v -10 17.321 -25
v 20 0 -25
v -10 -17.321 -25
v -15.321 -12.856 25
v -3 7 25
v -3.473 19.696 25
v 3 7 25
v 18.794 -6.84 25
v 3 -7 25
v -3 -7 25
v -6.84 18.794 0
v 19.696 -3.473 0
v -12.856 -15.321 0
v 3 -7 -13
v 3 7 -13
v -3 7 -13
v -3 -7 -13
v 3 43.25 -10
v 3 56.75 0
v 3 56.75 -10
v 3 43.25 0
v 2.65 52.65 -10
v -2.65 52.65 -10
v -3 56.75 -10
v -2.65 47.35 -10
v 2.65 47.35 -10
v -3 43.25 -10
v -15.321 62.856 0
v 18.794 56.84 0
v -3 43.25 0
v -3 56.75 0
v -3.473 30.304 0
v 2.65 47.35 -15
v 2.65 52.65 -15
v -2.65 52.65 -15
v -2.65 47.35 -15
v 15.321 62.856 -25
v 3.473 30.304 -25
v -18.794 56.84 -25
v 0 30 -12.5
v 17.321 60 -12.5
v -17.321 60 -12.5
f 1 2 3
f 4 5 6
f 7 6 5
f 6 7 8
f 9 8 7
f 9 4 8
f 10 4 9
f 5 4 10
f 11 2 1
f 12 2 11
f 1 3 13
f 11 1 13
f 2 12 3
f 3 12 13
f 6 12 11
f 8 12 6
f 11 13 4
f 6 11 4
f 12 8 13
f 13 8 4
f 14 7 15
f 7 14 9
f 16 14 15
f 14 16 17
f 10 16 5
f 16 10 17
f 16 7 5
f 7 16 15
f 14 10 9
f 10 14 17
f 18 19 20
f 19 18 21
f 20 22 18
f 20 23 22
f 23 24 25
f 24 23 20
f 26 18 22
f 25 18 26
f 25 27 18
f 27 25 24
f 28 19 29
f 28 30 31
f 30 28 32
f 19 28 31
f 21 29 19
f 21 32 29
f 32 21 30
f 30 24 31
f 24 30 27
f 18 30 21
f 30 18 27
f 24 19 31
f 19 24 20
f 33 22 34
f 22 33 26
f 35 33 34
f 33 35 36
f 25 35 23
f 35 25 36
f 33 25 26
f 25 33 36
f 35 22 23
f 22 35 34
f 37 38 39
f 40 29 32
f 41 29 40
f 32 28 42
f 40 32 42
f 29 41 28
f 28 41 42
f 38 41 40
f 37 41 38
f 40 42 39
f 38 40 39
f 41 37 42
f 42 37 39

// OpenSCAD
/***********************************************************************
Name ......... : usbCase.scad
Description....: Customizable USB Case
Author ....... : Garrett Melenka
Version ...... : V1.0 2016/12/17
Licence ...... : GPL
***********************************************************************/

//Outer Diameter of Usb Case
diameter = 40;
//Height of Usb Case
usbHeight = 50;
//Height of Use Case Cap
capHeight = 25;

//Measure Dimensions of Usb circuit board
//Width of Circuit portion of usb 
usbCircuitWidth = 14;
//Thickness of circuit portion of usb
usbCircuitThickness = 6;
//Length of Circuit Portion of USB
usbCircuitDepth = 38;

//Measure dimensions of USB/ PC connection
//Width of USB that connects to PC
usbWidth = 13.5;
//THickness of USB that connects to PC
usbThickness = 6;
//Depth USB will fit into cap
usbDepth = 10;


//Add magnet to cap 
magnetSize = 5.3;

//Change the shape of the case
facets = 3; //[3:1:100]
//Add a degree of twist to case
twist = 20;
//Convexity
convex = 0;

module usbCaseBottom()
{
    difference(){
        
    linear_extrude(height = usbHeight, center = true, convexity =convex, twist = twist)
        circle(r=diameter*0.5, $fn=facets);
        
    //cylinder(r = diameter*0.5, h = height, center = true, $fn=facets);
    
    translate([0,0,usbHeight*0.5-usbCircuitDepth*0.5]){
    
    cube(size = [usbCircuitThickness, usbCircuitWidth, usbCircuitDepth], center = true);
    }
    }
}

module usbCaseTop()
{
    
    twistPerHeight = twist / usbHeight;
    
    echo(twistPerHeight);
    
    twistCap = twistPerHeight * capHeight;
    
    
    
    
    difference()
    {
    linear_extrude(height = capHeight, center = true, convexity = convex, twist = twist)     circle(r=diameter*0.5, $fn = facets);    
    //cylinder(r = diameter*0.5, h = capHeight, center = true, $fn = facets);
    
        
    rotate([0,0,twist]){    
        
    translate([0,0,-capHeight*0.5 + usbDepth*0.5]){
    cube(size = [usbThickness,usbWidth, usbDepth], center = true);
    }
    
    translate([0,0,capHeight*0.5-magnetSize*0.5-usbDepth]){
    cube(size = [magnetSize, magnetSize, magnetSize], center = true);
    }
    }
    
    
}

    
}

usbCaseBottom();



//translate([0,0,usbHeight*0.5+capHeight*0.5+10])
translate([0, diameter+10, -capHeight*0.5])
{
    
 rotate([180,0,0]){
    
 rotate([0,0,-twist])
    {
 //mirror([1,0,0])
     {    
usbCaseTop();
 }
}
}
}
